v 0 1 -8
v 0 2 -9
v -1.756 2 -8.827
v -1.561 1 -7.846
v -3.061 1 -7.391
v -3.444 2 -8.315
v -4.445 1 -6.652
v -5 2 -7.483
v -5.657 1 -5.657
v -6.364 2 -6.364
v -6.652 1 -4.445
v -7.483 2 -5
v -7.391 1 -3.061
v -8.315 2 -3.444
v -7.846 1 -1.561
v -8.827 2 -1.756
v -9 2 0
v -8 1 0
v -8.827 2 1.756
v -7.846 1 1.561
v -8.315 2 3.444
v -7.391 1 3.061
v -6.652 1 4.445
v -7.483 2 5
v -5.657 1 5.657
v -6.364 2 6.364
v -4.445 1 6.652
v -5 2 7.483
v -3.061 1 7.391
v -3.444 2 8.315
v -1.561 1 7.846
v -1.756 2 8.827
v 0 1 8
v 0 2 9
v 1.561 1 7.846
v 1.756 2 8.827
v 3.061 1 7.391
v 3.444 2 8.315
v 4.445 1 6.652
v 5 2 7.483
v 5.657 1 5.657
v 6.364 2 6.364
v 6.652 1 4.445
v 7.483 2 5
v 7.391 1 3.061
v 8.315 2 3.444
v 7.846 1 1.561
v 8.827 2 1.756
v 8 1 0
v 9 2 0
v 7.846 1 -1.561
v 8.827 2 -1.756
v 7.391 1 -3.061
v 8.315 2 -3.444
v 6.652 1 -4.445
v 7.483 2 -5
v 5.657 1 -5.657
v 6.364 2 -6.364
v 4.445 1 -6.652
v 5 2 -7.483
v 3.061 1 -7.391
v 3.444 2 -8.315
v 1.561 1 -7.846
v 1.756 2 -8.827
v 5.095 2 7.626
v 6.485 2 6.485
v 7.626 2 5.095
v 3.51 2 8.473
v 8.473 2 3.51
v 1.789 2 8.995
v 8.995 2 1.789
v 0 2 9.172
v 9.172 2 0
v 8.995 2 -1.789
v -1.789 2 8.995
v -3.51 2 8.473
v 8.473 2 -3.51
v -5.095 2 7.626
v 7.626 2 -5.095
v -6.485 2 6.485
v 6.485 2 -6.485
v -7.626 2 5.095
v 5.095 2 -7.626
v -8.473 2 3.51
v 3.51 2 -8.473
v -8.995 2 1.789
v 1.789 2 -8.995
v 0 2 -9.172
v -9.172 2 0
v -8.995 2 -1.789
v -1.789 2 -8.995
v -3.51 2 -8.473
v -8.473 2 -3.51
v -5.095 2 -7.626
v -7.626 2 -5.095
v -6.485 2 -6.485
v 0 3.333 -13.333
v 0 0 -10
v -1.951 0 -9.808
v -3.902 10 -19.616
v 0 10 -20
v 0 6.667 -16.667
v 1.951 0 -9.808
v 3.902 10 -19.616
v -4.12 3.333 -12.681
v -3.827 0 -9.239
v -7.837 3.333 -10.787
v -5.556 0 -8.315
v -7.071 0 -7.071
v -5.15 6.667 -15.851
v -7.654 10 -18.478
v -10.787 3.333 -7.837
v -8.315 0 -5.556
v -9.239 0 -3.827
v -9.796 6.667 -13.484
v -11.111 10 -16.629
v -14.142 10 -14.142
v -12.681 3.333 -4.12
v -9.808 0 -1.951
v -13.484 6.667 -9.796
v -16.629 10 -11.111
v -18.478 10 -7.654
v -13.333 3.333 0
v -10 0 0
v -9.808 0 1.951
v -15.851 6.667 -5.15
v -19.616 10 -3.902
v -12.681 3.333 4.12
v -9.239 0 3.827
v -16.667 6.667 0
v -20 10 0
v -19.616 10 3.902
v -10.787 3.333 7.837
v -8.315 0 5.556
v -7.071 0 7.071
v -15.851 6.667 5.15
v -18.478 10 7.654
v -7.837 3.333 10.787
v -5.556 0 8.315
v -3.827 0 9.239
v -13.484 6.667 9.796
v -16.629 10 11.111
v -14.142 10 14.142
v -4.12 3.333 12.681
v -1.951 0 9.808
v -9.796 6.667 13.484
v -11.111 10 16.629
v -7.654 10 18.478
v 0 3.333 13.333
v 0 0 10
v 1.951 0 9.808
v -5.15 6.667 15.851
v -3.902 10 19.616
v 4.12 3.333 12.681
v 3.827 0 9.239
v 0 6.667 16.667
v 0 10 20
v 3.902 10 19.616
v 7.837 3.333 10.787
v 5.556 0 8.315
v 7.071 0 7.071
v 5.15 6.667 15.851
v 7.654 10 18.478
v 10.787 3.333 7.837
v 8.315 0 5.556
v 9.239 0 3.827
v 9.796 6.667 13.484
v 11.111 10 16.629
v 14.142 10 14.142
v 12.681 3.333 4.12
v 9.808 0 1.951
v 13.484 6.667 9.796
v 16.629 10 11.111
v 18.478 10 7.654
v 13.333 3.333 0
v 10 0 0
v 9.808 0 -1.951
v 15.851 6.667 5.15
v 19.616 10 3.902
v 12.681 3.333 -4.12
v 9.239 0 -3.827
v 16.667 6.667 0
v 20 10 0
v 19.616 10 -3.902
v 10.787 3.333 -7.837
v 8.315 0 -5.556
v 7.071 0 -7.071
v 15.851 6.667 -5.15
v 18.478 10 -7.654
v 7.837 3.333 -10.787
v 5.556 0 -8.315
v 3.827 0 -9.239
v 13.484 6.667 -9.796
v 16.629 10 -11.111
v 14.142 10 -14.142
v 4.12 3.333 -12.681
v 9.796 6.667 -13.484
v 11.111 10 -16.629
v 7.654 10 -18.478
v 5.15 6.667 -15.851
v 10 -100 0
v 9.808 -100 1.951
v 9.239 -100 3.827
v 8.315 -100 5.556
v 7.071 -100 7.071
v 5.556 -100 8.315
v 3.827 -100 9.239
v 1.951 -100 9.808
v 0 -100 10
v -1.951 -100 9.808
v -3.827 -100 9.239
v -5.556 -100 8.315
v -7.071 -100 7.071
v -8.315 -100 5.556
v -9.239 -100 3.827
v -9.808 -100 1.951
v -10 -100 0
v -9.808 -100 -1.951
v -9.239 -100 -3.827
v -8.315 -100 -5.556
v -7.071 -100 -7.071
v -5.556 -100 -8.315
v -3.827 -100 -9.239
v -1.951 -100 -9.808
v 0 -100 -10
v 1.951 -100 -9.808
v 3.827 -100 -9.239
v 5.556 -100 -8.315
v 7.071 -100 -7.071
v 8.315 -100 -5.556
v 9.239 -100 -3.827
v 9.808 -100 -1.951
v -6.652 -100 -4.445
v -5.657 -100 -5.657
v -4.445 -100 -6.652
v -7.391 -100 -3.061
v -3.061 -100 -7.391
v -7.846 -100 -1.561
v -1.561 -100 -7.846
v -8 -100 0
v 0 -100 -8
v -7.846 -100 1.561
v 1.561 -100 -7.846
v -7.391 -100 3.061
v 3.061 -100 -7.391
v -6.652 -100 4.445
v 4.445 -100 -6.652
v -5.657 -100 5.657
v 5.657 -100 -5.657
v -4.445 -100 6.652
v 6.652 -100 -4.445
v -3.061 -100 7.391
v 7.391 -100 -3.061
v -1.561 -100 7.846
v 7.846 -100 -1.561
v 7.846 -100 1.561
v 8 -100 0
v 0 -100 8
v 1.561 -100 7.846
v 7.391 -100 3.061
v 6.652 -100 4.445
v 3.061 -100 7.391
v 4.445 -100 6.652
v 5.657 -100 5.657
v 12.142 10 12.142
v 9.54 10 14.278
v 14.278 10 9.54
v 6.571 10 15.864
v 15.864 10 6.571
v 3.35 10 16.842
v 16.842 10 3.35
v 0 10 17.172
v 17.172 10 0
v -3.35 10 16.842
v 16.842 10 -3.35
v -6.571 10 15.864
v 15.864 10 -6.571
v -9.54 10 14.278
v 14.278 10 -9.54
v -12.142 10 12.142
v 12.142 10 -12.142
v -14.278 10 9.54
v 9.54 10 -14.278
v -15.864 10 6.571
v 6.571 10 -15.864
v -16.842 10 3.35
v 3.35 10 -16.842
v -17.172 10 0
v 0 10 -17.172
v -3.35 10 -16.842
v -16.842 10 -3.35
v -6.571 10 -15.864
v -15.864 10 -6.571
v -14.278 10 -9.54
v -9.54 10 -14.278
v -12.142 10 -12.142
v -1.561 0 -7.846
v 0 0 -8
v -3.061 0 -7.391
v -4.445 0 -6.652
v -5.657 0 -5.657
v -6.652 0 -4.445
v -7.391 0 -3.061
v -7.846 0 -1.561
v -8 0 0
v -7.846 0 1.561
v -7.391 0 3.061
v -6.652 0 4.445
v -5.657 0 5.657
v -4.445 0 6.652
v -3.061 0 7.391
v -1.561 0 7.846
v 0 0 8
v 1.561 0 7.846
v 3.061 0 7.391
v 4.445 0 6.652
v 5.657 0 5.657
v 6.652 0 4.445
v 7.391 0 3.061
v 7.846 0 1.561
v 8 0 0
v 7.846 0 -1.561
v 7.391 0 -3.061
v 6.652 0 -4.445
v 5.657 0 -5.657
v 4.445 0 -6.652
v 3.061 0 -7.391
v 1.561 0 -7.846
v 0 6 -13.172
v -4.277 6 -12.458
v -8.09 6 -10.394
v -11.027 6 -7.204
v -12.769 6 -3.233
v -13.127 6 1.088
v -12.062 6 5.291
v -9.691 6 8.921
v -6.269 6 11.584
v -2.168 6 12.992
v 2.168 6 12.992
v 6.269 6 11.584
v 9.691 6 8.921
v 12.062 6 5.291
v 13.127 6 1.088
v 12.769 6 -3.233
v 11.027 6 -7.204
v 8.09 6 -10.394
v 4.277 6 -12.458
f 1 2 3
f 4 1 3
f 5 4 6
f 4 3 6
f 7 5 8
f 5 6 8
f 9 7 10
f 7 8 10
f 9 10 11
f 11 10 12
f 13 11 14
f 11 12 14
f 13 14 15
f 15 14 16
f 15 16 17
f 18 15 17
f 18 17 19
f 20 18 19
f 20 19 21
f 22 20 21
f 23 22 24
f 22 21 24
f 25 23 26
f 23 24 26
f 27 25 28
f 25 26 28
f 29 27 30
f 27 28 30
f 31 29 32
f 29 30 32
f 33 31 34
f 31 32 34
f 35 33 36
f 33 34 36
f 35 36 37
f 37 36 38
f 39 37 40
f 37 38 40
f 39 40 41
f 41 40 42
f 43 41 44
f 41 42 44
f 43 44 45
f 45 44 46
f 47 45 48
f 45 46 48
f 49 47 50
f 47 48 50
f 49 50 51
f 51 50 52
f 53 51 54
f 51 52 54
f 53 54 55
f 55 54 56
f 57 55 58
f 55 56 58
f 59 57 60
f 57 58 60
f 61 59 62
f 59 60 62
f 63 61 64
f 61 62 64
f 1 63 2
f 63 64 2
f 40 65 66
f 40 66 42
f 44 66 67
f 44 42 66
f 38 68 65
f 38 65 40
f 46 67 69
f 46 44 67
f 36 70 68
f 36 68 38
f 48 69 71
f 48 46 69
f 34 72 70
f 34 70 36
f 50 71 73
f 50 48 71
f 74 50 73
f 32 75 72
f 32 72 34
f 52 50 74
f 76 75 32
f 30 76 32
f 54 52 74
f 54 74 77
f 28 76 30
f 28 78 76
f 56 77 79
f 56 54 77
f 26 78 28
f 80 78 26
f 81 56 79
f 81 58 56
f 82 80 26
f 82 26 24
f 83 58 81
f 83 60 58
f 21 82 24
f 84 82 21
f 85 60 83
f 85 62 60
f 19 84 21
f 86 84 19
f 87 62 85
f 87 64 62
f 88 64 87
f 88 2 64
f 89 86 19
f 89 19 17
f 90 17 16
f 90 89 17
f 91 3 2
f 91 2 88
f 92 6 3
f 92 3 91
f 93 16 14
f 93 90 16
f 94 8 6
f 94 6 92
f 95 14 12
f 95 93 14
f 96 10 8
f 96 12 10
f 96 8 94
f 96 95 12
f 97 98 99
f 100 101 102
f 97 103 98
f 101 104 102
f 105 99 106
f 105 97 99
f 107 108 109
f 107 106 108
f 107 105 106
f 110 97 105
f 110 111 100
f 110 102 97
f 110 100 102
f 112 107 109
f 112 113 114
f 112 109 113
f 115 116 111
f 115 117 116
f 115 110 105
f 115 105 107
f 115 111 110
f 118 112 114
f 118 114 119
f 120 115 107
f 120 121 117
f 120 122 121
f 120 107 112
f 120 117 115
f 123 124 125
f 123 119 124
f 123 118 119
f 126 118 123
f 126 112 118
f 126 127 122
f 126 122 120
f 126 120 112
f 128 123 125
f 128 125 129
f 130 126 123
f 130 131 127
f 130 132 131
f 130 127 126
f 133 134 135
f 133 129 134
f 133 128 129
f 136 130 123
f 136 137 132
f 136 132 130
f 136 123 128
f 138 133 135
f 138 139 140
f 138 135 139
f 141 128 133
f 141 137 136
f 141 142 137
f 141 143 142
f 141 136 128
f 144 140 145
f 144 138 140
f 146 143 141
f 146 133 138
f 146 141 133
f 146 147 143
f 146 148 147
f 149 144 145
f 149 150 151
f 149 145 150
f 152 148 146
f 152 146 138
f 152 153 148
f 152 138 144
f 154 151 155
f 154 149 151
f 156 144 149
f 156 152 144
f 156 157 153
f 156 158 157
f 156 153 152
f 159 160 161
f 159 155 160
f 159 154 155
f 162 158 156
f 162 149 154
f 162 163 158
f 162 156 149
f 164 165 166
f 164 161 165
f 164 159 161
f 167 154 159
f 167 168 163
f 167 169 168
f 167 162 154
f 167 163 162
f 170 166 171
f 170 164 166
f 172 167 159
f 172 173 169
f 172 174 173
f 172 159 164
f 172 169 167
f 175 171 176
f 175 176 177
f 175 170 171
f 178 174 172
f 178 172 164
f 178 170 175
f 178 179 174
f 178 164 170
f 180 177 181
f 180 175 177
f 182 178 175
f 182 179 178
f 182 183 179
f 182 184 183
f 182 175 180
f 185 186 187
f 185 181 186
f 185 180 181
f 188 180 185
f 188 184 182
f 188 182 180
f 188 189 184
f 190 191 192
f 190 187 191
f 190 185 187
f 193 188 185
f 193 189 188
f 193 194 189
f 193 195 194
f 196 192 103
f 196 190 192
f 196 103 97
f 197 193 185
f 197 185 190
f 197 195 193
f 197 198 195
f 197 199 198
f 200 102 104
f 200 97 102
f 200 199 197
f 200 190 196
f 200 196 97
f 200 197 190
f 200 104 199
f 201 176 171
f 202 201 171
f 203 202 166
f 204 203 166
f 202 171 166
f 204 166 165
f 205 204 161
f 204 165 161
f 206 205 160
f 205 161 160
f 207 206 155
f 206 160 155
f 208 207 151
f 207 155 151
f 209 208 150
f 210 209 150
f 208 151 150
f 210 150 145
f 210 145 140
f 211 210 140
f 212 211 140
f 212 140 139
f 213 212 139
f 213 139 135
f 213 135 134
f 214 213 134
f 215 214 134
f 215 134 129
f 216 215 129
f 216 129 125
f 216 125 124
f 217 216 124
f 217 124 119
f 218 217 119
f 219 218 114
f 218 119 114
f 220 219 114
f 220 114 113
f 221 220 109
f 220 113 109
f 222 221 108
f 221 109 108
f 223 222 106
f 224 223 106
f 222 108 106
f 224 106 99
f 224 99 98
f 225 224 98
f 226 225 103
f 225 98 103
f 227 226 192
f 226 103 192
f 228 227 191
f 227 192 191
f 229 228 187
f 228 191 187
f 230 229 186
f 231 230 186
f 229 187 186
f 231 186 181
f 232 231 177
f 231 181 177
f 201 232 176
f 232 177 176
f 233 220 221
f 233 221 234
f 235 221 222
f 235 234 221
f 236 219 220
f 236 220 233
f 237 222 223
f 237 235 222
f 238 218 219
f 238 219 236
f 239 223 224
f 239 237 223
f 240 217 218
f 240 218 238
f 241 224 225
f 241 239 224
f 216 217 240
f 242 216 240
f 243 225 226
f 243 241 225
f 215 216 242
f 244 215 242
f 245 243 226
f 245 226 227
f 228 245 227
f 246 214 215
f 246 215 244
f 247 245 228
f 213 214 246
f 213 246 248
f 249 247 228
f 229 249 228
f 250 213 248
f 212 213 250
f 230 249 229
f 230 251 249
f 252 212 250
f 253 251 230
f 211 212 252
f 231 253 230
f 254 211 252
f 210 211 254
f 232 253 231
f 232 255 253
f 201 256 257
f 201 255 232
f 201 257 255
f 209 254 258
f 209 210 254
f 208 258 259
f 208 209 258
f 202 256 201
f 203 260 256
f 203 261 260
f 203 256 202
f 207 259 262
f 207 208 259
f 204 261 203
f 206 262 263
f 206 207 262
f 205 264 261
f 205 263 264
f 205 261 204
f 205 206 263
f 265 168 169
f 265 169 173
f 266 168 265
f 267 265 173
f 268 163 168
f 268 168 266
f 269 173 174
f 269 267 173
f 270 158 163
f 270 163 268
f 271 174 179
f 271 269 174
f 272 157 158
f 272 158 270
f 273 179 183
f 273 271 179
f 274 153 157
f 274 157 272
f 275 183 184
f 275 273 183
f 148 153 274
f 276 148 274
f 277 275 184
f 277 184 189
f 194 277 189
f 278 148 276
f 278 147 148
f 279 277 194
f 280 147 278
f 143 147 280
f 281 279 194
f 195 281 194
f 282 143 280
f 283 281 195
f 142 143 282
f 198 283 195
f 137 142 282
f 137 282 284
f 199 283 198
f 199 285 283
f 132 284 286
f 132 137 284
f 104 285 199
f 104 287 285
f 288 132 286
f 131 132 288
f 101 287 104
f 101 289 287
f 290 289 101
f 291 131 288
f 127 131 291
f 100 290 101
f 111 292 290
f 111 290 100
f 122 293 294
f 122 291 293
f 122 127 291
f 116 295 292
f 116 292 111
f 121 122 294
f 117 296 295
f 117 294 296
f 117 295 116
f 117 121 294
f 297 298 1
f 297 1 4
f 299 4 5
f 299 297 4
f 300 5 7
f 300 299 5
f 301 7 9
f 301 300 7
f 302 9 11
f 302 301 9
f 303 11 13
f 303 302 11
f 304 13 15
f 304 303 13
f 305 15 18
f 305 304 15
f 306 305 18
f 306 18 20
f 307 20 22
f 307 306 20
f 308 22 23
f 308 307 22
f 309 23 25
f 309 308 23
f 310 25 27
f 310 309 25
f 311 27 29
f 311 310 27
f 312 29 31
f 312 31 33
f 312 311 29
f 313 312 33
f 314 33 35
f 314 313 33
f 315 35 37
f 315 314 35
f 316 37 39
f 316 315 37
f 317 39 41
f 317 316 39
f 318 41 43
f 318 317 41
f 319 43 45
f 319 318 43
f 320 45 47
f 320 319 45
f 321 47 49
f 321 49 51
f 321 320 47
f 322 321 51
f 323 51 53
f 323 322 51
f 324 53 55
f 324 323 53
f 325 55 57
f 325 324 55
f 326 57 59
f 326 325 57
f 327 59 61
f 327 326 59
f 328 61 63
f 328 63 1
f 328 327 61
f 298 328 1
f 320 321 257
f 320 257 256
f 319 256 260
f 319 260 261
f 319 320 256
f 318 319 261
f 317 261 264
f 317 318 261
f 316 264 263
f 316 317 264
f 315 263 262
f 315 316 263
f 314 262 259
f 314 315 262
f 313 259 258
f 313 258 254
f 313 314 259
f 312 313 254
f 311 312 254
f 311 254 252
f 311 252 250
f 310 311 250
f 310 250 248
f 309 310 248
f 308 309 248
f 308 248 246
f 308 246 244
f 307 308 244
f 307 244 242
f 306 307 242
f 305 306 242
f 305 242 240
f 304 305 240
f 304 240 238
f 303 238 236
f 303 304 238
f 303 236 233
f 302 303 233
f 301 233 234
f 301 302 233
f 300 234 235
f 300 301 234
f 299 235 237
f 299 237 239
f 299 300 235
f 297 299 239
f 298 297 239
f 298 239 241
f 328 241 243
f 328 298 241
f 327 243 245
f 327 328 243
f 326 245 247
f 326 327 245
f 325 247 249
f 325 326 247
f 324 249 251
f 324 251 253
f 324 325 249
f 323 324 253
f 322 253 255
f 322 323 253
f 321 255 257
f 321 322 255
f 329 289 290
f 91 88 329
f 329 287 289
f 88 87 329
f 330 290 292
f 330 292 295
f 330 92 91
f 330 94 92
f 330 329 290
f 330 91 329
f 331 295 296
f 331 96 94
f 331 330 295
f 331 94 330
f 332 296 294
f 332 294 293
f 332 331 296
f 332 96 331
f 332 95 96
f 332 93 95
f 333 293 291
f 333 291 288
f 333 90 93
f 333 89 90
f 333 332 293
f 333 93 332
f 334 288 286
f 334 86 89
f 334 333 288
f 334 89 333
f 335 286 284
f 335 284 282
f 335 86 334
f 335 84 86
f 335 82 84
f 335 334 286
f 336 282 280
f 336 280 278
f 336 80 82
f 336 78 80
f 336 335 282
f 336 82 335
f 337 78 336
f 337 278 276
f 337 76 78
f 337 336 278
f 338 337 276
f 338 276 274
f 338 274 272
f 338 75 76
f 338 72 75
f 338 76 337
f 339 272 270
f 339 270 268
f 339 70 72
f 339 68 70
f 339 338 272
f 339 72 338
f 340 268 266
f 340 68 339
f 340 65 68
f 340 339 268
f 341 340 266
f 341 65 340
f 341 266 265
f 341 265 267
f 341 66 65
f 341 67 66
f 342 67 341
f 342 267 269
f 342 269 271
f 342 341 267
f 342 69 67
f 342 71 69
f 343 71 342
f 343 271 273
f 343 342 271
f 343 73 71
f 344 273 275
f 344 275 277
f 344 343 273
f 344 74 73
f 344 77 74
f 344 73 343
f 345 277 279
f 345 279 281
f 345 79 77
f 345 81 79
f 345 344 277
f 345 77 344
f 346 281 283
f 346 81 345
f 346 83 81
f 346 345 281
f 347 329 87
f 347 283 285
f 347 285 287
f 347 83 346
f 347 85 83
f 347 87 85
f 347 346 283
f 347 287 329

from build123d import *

# Parameters (mm, degrees)
F0_R     = 10
F0_R_2   = 8
F1_DEPTH = 100
F4_SIZE  = 1


with BuildPart() as f1:
    # F0 (on Front) → F1 (new body)
    with BuildSketch(Plane.XZ):
        Circle(F0_R)
        Circle(F0_R_2, mode=Mode.SUBTRACT)
    extrude(amount=F1_DEPTH)

    # F2 (on Right) → F3 (revolve)
    with BuildSketch(Plane.YZ):
        Polygon((2, -8), (0, -8), (0, -10), (10, -20), (10, -17.171573), (2, -9.171573), align=None)
    revolve(axis=Axis((0, 7.857602, 0), (0, 1, 0)))

    # F4
    f4_edges = [f1.edges().sort_by_distance(p)[0] for p in [
        (0, 2, 8),
    ]]
    chamfer(f4_edges, length=F4_SIZE)


solid = f1.part
